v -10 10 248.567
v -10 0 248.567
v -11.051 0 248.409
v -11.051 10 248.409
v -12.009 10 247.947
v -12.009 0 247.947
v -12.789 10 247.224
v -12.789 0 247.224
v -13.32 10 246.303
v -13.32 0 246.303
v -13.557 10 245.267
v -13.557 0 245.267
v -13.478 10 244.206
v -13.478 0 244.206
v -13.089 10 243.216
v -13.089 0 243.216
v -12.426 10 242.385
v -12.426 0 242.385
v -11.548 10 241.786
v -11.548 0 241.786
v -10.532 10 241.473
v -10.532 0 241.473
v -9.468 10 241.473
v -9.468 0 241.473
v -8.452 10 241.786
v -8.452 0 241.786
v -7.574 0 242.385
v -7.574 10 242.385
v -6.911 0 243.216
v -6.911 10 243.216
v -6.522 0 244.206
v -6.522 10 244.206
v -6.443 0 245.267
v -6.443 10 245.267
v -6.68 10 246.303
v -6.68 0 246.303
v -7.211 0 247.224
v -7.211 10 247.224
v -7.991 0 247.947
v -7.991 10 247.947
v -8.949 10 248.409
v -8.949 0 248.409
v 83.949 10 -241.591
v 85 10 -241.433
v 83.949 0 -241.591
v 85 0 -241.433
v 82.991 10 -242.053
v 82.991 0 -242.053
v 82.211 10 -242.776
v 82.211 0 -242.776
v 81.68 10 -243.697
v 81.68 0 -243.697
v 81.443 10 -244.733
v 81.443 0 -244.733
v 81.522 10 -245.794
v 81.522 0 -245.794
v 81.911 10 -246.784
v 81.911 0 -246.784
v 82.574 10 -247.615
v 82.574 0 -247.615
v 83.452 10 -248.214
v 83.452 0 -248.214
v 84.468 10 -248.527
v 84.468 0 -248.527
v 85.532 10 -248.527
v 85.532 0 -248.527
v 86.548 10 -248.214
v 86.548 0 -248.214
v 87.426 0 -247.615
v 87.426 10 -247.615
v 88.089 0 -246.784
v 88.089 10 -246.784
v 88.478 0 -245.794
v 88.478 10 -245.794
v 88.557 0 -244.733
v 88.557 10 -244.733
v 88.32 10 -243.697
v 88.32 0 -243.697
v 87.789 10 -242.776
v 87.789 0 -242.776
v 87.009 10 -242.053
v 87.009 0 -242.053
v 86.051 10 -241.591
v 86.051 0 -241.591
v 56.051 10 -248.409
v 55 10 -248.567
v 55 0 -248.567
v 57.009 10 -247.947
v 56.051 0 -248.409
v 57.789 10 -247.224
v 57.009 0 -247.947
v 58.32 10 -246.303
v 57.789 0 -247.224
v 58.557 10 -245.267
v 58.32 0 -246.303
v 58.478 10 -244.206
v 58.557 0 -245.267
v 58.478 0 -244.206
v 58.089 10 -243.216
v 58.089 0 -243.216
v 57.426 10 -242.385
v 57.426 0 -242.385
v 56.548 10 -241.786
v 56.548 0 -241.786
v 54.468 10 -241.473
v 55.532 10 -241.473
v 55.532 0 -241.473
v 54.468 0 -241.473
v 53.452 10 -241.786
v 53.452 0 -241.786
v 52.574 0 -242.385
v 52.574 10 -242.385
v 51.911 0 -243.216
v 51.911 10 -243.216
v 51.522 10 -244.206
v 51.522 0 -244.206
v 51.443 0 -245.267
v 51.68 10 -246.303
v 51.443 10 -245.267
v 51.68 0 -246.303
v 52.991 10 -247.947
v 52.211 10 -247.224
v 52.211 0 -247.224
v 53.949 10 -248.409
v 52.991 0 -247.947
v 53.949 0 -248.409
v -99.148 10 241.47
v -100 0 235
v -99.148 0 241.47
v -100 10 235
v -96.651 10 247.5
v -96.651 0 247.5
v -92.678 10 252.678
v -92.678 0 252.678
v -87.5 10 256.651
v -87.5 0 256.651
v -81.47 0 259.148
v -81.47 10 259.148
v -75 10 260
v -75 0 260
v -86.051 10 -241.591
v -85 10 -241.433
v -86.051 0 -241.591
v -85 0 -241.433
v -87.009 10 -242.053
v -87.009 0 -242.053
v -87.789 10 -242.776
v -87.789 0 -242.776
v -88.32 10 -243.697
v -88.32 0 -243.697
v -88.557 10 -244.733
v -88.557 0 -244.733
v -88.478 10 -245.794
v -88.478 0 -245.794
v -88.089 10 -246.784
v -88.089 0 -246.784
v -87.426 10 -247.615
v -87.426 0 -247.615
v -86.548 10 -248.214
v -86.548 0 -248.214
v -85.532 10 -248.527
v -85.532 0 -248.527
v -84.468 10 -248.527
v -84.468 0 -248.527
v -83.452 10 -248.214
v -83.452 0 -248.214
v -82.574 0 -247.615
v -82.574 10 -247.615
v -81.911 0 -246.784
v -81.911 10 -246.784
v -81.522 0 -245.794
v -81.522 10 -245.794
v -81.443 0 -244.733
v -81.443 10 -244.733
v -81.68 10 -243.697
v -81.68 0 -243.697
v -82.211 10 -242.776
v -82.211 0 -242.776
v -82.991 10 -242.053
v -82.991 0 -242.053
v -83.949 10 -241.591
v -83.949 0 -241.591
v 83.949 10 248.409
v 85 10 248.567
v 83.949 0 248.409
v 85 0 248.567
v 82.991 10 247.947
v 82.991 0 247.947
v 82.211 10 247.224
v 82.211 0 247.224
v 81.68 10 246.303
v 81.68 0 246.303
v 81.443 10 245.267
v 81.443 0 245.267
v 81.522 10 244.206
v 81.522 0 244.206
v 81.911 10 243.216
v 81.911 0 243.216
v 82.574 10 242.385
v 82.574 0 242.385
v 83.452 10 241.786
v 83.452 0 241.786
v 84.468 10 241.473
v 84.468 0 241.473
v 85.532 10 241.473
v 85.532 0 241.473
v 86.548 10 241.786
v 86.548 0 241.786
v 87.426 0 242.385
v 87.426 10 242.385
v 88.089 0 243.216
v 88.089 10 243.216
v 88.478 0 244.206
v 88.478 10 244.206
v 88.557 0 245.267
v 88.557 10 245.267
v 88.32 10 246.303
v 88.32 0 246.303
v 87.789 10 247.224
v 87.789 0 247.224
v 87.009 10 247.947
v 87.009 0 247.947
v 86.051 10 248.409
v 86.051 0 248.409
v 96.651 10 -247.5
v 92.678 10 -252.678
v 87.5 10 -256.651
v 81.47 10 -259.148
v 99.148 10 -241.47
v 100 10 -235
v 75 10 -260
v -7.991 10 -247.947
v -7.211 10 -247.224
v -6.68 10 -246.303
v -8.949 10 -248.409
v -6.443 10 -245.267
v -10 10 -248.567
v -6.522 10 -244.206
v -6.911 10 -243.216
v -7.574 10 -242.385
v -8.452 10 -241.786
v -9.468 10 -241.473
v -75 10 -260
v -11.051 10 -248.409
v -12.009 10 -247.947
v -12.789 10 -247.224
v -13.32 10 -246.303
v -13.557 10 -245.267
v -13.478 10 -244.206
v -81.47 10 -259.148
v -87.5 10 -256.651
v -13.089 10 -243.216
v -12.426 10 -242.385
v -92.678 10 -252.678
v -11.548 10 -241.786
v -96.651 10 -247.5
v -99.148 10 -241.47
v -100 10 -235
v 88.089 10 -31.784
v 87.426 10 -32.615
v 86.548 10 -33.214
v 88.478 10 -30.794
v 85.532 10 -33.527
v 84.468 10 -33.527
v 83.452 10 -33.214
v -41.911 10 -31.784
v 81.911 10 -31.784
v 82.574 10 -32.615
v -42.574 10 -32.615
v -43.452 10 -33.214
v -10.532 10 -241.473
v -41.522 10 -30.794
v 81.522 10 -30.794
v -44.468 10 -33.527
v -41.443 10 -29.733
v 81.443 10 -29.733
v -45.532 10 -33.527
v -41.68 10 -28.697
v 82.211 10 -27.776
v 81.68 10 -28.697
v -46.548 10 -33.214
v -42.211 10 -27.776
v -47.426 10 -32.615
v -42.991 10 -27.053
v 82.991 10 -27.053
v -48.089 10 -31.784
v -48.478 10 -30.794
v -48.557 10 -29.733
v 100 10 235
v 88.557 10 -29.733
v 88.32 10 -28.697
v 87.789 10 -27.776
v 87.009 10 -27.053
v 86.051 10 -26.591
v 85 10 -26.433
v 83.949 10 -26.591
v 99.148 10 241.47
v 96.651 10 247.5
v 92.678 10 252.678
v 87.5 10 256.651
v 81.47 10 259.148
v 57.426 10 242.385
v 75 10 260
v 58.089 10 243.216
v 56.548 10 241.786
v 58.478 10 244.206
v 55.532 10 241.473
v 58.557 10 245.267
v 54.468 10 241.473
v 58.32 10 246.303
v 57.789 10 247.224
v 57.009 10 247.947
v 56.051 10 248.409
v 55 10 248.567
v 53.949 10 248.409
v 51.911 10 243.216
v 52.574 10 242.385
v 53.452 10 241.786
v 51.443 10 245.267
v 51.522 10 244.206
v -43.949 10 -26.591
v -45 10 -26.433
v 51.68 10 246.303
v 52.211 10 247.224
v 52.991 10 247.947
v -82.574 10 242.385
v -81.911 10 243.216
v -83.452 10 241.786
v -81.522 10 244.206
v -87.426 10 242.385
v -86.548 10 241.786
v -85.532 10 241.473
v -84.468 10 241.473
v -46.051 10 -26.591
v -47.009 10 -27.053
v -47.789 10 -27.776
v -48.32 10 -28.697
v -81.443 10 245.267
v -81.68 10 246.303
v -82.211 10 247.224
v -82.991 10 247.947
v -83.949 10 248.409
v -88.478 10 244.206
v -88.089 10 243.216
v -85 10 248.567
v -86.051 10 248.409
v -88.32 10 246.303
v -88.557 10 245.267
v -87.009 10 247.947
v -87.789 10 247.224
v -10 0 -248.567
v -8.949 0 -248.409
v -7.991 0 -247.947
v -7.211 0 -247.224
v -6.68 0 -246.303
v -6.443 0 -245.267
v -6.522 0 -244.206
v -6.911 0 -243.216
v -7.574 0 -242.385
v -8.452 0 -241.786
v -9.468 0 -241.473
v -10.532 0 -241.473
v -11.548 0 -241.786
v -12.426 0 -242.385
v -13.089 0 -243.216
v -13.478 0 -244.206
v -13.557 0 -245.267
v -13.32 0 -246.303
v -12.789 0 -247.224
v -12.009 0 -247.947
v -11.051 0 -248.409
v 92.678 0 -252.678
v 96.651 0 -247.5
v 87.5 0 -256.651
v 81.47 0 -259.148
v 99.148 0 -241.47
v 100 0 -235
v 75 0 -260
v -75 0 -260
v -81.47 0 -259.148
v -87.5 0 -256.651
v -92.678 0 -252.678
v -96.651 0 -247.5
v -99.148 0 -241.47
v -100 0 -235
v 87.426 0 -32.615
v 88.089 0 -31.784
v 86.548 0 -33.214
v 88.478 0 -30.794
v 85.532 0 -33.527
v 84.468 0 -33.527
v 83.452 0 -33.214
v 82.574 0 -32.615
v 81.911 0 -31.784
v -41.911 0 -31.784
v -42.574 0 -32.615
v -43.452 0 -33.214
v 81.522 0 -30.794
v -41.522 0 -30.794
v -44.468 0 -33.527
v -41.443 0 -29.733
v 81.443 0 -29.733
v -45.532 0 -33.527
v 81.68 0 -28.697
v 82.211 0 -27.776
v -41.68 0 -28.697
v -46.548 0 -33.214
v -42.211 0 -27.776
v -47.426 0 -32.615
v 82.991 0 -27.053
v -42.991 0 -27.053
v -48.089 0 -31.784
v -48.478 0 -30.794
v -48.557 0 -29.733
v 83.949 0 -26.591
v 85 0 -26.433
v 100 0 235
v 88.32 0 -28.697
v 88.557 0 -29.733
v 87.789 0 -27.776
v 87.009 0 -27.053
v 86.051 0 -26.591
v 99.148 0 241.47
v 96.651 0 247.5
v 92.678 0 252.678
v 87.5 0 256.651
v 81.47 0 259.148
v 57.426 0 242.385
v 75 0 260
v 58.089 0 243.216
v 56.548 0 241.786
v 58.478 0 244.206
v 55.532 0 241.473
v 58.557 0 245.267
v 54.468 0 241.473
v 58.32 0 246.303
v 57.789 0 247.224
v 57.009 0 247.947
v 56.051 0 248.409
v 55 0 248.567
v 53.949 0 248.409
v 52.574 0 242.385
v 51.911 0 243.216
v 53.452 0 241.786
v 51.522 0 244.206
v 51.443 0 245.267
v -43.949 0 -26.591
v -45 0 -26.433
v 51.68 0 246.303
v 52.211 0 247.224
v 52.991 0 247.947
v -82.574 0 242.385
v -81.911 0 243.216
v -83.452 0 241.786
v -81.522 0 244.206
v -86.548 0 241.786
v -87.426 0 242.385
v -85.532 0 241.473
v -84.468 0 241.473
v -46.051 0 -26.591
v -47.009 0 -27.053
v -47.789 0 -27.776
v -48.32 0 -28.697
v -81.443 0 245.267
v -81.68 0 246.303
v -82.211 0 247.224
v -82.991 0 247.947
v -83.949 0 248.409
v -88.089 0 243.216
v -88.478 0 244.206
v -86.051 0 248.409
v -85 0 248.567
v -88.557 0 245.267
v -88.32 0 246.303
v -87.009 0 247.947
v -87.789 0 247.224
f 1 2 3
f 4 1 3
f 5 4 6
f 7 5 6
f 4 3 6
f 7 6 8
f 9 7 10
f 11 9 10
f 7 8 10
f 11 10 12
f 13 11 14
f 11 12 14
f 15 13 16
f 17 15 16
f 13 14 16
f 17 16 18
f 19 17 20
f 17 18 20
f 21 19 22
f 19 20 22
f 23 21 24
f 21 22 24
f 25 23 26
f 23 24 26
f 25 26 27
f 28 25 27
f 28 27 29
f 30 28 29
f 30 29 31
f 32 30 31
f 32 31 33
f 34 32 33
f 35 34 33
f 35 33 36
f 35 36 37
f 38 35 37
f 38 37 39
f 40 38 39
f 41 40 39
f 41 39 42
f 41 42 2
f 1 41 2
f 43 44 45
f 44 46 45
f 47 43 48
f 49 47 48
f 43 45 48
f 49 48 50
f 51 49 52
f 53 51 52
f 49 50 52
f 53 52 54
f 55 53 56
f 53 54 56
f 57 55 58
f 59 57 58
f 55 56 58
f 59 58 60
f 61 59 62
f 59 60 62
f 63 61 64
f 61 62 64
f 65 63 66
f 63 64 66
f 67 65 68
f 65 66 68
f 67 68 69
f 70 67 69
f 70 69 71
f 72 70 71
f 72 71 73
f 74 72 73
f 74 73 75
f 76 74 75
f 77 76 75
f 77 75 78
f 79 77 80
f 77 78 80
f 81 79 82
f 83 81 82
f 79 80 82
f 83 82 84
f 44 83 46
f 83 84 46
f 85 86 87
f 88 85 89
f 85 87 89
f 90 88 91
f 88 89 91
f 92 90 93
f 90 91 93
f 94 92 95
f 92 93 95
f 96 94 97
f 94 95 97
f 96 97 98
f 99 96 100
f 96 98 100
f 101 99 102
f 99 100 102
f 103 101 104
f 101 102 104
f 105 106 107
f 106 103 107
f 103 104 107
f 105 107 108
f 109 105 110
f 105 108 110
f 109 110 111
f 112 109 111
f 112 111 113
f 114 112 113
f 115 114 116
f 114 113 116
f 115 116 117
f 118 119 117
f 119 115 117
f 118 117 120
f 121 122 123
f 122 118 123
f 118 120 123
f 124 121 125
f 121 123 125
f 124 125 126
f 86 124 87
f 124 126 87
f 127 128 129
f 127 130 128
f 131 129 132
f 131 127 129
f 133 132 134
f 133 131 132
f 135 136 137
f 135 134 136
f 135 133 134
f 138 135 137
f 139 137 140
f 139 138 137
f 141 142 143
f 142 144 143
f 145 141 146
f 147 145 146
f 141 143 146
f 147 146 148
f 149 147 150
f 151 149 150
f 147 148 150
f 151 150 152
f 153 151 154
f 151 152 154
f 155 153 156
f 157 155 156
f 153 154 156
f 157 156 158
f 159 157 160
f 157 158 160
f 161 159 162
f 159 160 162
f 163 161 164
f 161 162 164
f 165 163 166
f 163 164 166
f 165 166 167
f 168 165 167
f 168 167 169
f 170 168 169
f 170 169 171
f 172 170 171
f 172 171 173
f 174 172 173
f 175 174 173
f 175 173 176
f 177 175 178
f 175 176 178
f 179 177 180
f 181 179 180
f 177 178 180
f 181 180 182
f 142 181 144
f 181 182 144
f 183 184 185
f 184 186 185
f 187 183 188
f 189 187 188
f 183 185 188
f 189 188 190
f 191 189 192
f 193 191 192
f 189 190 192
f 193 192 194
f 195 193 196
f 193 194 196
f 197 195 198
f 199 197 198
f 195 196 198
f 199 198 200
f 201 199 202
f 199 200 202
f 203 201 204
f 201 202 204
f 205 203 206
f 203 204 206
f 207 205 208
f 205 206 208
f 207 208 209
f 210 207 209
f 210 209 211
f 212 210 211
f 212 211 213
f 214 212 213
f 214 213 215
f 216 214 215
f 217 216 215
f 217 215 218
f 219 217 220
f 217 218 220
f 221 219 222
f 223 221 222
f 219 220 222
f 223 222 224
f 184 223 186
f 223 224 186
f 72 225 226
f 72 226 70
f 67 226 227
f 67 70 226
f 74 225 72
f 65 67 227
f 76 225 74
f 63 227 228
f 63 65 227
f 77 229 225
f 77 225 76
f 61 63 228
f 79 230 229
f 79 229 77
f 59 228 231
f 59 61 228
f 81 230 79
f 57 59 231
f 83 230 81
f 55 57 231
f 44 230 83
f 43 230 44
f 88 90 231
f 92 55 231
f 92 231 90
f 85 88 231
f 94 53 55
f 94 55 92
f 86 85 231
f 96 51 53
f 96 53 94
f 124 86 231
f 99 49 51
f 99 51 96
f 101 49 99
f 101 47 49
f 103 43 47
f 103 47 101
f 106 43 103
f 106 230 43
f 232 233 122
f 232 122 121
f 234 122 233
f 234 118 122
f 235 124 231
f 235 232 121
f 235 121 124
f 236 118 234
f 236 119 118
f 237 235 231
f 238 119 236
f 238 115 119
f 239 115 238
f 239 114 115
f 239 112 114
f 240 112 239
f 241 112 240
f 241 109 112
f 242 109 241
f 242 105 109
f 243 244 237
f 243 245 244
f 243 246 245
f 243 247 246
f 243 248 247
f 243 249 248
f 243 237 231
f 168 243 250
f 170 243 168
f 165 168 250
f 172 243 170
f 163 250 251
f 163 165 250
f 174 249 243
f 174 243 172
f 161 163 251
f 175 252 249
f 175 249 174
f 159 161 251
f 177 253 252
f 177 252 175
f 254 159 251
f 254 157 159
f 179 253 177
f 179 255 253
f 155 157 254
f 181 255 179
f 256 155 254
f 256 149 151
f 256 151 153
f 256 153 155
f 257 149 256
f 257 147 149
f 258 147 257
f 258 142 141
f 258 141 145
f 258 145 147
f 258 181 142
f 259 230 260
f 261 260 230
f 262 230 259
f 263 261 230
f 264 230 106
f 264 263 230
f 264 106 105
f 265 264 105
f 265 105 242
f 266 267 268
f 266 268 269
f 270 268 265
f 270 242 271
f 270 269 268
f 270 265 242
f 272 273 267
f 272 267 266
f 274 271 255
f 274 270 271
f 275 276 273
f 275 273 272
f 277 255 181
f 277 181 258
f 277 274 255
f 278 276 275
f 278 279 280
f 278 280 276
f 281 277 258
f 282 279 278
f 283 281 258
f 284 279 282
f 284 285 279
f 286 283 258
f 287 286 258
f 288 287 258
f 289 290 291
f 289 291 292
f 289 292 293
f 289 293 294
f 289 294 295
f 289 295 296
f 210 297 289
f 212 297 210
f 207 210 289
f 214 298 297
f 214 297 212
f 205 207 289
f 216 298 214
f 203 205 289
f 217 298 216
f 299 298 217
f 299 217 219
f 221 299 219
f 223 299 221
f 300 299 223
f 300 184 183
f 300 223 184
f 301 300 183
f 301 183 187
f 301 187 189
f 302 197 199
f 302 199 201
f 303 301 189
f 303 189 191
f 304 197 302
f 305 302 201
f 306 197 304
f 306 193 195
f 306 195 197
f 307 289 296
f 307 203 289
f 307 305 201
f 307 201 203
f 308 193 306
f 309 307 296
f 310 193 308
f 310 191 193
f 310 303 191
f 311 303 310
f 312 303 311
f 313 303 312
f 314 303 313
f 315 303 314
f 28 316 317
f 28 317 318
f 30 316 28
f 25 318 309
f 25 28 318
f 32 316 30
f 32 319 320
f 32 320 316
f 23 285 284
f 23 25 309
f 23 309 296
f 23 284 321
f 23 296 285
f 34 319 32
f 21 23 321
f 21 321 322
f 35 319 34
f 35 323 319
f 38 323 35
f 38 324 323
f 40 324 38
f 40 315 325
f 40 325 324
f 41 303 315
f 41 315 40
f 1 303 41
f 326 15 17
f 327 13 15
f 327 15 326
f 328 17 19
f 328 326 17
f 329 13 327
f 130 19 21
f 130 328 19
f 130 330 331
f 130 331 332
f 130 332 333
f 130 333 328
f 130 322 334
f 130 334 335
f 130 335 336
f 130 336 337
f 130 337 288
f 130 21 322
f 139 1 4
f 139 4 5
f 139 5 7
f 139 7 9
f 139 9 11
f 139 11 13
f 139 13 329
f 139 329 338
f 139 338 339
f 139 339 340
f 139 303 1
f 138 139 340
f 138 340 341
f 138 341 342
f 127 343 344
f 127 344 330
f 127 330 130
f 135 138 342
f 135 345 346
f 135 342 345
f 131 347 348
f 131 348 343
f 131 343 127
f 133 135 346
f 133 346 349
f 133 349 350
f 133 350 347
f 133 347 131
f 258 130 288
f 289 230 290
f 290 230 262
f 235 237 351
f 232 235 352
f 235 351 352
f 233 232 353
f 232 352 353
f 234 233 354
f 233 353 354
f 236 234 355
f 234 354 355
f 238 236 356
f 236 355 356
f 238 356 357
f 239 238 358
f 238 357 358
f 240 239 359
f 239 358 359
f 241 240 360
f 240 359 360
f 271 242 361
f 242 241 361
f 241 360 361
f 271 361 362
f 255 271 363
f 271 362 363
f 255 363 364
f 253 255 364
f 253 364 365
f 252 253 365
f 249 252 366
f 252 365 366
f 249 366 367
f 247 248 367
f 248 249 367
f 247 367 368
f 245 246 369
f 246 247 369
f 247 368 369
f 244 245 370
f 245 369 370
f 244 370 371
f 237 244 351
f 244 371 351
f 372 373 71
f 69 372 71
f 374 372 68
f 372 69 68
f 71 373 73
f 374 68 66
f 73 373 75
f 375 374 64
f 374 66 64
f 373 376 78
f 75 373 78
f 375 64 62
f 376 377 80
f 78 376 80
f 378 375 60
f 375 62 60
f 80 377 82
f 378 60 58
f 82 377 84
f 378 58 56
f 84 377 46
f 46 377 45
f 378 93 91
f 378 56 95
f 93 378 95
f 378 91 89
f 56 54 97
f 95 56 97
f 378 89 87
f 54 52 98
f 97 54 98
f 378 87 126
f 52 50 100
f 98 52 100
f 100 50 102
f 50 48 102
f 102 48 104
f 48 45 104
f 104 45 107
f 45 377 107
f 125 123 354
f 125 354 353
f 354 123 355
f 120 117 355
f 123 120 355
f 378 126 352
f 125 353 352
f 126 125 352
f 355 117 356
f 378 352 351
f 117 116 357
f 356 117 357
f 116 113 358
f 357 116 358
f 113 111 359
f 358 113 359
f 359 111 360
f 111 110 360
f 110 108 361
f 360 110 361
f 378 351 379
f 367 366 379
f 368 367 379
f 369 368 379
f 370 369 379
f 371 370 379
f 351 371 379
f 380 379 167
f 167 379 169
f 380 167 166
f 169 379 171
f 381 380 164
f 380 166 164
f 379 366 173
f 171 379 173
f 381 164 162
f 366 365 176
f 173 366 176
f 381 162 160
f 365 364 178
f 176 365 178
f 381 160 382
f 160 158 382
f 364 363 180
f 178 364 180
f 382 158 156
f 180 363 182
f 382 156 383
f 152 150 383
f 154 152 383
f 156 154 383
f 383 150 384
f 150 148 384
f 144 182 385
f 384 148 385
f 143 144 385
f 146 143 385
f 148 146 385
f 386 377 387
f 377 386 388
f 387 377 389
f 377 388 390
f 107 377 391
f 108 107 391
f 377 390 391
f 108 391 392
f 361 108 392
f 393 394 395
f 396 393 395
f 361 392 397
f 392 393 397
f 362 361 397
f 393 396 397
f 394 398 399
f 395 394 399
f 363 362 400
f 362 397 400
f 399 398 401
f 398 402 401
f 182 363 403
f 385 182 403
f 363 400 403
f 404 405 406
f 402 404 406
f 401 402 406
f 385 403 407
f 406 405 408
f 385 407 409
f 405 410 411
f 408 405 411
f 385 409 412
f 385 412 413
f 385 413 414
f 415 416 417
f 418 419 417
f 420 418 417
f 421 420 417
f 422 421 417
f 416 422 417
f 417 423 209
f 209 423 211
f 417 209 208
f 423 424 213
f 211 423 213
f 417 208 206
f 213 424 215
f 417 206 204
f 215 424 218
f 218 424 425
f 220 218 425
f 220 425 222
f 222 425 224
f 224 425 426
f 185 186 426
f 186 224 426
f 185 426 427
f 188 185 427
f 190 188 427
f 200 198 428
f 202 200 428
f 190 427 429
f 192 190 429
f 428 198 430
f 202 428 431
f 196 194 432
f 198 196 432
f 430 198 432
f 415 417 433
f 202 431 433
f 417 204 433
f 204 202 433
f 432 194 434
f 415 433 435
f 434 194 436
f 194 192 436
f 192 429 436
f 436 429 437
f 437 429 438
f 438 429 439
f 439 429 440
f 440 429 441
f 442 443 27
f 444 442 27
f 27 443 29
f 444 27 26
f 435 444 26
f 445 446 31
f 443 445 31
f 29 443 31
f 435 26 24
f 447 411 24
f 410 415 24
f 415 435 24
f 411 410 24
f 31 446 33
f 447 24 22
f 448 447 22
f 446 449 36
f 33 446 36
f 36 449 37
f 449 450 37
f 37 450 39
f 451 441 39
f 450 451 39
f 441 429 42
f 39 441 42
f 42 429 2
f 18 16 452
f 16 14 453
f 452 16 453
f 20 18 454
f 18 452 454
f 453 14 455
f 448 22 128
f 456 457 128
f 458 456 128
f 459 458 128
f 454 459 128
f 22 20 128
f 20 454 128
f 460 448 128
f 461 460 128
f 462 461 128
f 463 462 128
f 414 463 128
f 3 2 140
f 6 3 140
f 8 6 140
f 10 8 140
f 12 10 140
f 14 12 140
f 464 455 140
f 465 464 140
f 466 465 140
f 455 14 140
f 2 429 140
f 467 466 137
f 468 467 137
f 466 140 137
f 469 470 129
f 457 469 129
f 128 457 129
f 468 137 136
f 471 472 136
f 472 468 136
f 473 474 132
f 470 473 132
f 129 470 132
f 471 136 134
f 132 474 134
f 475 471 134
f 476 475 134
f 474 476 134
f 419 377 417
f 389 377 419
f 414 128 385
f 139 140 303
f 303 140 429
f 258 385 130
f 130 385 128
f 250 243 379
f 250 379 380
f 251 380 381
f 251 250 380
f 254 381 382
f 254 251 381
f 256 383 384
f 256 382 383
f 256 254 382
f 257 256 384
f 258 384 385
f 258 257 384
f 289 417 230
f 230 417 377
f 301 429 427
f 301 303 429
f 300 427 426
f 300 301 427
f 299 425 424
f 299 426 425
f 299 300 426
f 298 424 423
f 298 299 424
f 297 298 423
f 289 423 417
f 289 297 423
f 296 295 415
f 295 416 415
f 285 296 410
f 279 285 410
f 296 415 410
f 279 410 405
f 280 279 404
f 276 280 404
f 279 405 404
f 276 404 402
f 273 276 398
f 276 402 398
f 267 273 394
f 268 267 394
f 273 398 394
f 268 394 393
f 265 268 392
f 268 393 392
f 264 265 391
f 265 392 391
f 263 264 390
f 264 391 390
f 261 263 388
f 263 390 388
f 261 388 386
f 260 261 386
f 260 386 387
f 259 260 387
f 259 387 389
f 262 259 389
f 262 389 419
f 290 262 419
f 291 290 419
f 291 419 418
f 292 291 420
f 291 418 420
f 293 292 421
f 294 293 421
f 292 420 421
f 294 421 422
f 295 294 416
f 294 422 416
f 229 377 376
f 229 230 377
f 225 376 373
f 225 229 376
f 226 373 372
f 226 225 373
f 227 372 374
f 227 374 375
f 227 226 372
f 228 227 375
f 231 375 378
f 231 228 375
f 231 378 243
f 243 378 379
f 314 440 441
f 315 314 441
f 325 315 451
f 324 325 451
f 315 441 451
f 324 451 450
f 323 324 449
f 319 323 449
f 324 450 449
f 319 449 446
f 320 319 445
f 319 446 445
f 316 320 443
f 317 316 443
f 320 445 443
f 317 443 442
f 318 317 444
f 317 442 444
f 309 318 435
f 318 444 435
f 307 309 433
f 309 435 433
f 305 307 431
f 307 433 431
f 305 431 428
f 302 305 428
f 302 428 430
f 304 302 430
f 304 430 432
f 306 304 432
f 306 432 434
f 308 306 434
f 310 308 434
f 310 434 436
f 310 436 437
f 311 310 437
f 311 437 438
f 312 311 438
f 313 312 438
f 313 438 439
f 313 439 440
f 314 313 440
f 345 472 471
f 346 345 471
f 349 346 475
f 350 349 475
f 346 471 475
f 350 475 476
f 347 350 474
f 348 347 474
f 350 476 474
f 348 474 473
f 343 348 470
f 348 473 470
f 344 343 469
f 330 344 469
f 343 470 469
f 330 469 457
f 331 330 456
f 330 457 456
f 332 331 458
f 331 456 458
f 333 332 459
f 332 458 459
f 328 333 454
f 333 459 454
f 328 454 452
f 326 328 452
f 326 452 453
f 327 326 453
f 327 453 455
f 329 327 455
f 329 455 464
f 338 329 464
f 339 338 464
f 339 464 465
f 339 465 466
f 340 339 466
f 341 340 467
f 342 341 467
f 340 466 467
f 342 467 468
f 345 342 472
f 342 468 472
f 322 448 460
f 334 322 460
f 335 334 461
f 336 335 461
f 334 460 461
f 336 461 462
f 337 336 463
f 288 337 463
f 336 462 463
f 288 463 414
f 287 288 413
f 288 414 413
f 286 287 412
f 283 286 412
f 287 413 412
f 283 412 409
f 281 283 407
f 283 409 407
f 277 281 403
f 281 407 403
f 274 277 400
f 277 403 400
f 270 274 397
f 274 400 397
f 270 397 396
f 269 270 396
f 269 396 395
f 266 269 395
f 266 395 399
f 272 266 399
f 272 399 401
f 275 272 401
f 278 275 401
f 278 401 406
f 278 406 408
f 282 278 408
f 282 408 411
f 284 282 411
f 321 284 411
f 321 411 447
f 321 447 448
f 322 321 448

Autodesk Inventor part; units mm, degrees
ref_plane "YZ Plane" through (0, 0, 0) normal (1, 0, 0) x (0, 1, 0)
ref_plane "XZ Plane" through (0, 0, 0) normal (0, 1, 0) x (-1, 0, 0)
ref_plane "XY Plane" through (0, 0, 0) normal (0, 0, 1) x (1, 0, 0)
sketch "Sketch1" plane through (0, 0, 0) normal (0, 1, 0) x (-1, 0, 0)
  line L0 (-100, -260) -> (100, -260)
  line L1 (100, -260) -> (100, 260)
  line L2 (100, 260) -> (-100, 260)
  line L3 (-100, 260) -> (-100, -260)
  line L4 (-100, -260) -> (100, 260) construction
  line L5 (100, -260) -> (-100, 260) construction
  point P0 (0, 0)
  dimension "d0" = 200
  dimension "d1" = 520
extrude "Extrusion1" add sketch "Sketch1" along normal blind 10
fillet "Fillet1" radius 25 4 edges at (-100, 5, -260) (-100, 5, 260) (100, 5, 260) (100, 5, -260)
sketch "Sketch2" plane through (0, 10, 0) normal (0, 1, 0) x (1, 0, 0)
  line L0 (100, -235) -> (100, 235) projected
  line L1 (-75, -260) -> (75, -260) projected
  point P0 (0, 0)
  point P1 (85, -245)
  dimension "d5" = 15
  dimension "d6" = 15
hole "Hole1" at (85, 10, 245) direction (0, -1, 0) diameter 7.134 end through all thread size "M8x0.8" class "6H" standard "ISO Metric profile"
pattern_linear "Rectangular Pattern1" count 2 spacing 170 along (-1, 0, 0) count 2 spacing 490 along (0, 0, -1) of "Hole1"
sketch "Sketch3" plane through (0, 10, 0) normal (0, 1, 0) x (1, 0, 0)
  line L0 (-75, -260) -> (75, -260) projected
  line L1 (-100, 235) -> (-100, -235) projected
  point P0 (0, 0)
  point P1 (-10, -245)
  point P2 (55, -245)
  dimension "d20" = 15
  dimension "d21" = 90
  dimension "d22" = 65
  dimension "d23" = 15
hole "Hole2" at (-10, 10, 245) at (55, 10, 245) direction (0, -1, 0) diameter 7.134 end through all thread size "M8x0.8" class "6H" standard "ISO Metric profile"
mirror "Mirror1" about plane through (0, 0, 0) normal (0, 0, 1) of "Hole2"
sketch "Sketch4" plane through (0, 10, 0) normal (0, 1, 0) x (1, 0, 0)
  line L0 (75, 260) -> (-75, 260) projected
  line L1 (100, -235) -> (100, 235) projected
  point P0 (0, 0)
  point P1 (-45, 30)
  point P2 (85, 30)
  dimension "d31" = 230
  dimension "d32" = 145
  dimension "d33" = 230
  dimension "d34" = 15
hole "Hole3" at (-45, 10, -30) at (85, 10, -30) direction (0, -1, 0) diameter 7.134 end through all thread size "M8x0.8" class "6H" standard "ISO Metric profile"
properties part number "Top_plate" material "Stainless Steel"
